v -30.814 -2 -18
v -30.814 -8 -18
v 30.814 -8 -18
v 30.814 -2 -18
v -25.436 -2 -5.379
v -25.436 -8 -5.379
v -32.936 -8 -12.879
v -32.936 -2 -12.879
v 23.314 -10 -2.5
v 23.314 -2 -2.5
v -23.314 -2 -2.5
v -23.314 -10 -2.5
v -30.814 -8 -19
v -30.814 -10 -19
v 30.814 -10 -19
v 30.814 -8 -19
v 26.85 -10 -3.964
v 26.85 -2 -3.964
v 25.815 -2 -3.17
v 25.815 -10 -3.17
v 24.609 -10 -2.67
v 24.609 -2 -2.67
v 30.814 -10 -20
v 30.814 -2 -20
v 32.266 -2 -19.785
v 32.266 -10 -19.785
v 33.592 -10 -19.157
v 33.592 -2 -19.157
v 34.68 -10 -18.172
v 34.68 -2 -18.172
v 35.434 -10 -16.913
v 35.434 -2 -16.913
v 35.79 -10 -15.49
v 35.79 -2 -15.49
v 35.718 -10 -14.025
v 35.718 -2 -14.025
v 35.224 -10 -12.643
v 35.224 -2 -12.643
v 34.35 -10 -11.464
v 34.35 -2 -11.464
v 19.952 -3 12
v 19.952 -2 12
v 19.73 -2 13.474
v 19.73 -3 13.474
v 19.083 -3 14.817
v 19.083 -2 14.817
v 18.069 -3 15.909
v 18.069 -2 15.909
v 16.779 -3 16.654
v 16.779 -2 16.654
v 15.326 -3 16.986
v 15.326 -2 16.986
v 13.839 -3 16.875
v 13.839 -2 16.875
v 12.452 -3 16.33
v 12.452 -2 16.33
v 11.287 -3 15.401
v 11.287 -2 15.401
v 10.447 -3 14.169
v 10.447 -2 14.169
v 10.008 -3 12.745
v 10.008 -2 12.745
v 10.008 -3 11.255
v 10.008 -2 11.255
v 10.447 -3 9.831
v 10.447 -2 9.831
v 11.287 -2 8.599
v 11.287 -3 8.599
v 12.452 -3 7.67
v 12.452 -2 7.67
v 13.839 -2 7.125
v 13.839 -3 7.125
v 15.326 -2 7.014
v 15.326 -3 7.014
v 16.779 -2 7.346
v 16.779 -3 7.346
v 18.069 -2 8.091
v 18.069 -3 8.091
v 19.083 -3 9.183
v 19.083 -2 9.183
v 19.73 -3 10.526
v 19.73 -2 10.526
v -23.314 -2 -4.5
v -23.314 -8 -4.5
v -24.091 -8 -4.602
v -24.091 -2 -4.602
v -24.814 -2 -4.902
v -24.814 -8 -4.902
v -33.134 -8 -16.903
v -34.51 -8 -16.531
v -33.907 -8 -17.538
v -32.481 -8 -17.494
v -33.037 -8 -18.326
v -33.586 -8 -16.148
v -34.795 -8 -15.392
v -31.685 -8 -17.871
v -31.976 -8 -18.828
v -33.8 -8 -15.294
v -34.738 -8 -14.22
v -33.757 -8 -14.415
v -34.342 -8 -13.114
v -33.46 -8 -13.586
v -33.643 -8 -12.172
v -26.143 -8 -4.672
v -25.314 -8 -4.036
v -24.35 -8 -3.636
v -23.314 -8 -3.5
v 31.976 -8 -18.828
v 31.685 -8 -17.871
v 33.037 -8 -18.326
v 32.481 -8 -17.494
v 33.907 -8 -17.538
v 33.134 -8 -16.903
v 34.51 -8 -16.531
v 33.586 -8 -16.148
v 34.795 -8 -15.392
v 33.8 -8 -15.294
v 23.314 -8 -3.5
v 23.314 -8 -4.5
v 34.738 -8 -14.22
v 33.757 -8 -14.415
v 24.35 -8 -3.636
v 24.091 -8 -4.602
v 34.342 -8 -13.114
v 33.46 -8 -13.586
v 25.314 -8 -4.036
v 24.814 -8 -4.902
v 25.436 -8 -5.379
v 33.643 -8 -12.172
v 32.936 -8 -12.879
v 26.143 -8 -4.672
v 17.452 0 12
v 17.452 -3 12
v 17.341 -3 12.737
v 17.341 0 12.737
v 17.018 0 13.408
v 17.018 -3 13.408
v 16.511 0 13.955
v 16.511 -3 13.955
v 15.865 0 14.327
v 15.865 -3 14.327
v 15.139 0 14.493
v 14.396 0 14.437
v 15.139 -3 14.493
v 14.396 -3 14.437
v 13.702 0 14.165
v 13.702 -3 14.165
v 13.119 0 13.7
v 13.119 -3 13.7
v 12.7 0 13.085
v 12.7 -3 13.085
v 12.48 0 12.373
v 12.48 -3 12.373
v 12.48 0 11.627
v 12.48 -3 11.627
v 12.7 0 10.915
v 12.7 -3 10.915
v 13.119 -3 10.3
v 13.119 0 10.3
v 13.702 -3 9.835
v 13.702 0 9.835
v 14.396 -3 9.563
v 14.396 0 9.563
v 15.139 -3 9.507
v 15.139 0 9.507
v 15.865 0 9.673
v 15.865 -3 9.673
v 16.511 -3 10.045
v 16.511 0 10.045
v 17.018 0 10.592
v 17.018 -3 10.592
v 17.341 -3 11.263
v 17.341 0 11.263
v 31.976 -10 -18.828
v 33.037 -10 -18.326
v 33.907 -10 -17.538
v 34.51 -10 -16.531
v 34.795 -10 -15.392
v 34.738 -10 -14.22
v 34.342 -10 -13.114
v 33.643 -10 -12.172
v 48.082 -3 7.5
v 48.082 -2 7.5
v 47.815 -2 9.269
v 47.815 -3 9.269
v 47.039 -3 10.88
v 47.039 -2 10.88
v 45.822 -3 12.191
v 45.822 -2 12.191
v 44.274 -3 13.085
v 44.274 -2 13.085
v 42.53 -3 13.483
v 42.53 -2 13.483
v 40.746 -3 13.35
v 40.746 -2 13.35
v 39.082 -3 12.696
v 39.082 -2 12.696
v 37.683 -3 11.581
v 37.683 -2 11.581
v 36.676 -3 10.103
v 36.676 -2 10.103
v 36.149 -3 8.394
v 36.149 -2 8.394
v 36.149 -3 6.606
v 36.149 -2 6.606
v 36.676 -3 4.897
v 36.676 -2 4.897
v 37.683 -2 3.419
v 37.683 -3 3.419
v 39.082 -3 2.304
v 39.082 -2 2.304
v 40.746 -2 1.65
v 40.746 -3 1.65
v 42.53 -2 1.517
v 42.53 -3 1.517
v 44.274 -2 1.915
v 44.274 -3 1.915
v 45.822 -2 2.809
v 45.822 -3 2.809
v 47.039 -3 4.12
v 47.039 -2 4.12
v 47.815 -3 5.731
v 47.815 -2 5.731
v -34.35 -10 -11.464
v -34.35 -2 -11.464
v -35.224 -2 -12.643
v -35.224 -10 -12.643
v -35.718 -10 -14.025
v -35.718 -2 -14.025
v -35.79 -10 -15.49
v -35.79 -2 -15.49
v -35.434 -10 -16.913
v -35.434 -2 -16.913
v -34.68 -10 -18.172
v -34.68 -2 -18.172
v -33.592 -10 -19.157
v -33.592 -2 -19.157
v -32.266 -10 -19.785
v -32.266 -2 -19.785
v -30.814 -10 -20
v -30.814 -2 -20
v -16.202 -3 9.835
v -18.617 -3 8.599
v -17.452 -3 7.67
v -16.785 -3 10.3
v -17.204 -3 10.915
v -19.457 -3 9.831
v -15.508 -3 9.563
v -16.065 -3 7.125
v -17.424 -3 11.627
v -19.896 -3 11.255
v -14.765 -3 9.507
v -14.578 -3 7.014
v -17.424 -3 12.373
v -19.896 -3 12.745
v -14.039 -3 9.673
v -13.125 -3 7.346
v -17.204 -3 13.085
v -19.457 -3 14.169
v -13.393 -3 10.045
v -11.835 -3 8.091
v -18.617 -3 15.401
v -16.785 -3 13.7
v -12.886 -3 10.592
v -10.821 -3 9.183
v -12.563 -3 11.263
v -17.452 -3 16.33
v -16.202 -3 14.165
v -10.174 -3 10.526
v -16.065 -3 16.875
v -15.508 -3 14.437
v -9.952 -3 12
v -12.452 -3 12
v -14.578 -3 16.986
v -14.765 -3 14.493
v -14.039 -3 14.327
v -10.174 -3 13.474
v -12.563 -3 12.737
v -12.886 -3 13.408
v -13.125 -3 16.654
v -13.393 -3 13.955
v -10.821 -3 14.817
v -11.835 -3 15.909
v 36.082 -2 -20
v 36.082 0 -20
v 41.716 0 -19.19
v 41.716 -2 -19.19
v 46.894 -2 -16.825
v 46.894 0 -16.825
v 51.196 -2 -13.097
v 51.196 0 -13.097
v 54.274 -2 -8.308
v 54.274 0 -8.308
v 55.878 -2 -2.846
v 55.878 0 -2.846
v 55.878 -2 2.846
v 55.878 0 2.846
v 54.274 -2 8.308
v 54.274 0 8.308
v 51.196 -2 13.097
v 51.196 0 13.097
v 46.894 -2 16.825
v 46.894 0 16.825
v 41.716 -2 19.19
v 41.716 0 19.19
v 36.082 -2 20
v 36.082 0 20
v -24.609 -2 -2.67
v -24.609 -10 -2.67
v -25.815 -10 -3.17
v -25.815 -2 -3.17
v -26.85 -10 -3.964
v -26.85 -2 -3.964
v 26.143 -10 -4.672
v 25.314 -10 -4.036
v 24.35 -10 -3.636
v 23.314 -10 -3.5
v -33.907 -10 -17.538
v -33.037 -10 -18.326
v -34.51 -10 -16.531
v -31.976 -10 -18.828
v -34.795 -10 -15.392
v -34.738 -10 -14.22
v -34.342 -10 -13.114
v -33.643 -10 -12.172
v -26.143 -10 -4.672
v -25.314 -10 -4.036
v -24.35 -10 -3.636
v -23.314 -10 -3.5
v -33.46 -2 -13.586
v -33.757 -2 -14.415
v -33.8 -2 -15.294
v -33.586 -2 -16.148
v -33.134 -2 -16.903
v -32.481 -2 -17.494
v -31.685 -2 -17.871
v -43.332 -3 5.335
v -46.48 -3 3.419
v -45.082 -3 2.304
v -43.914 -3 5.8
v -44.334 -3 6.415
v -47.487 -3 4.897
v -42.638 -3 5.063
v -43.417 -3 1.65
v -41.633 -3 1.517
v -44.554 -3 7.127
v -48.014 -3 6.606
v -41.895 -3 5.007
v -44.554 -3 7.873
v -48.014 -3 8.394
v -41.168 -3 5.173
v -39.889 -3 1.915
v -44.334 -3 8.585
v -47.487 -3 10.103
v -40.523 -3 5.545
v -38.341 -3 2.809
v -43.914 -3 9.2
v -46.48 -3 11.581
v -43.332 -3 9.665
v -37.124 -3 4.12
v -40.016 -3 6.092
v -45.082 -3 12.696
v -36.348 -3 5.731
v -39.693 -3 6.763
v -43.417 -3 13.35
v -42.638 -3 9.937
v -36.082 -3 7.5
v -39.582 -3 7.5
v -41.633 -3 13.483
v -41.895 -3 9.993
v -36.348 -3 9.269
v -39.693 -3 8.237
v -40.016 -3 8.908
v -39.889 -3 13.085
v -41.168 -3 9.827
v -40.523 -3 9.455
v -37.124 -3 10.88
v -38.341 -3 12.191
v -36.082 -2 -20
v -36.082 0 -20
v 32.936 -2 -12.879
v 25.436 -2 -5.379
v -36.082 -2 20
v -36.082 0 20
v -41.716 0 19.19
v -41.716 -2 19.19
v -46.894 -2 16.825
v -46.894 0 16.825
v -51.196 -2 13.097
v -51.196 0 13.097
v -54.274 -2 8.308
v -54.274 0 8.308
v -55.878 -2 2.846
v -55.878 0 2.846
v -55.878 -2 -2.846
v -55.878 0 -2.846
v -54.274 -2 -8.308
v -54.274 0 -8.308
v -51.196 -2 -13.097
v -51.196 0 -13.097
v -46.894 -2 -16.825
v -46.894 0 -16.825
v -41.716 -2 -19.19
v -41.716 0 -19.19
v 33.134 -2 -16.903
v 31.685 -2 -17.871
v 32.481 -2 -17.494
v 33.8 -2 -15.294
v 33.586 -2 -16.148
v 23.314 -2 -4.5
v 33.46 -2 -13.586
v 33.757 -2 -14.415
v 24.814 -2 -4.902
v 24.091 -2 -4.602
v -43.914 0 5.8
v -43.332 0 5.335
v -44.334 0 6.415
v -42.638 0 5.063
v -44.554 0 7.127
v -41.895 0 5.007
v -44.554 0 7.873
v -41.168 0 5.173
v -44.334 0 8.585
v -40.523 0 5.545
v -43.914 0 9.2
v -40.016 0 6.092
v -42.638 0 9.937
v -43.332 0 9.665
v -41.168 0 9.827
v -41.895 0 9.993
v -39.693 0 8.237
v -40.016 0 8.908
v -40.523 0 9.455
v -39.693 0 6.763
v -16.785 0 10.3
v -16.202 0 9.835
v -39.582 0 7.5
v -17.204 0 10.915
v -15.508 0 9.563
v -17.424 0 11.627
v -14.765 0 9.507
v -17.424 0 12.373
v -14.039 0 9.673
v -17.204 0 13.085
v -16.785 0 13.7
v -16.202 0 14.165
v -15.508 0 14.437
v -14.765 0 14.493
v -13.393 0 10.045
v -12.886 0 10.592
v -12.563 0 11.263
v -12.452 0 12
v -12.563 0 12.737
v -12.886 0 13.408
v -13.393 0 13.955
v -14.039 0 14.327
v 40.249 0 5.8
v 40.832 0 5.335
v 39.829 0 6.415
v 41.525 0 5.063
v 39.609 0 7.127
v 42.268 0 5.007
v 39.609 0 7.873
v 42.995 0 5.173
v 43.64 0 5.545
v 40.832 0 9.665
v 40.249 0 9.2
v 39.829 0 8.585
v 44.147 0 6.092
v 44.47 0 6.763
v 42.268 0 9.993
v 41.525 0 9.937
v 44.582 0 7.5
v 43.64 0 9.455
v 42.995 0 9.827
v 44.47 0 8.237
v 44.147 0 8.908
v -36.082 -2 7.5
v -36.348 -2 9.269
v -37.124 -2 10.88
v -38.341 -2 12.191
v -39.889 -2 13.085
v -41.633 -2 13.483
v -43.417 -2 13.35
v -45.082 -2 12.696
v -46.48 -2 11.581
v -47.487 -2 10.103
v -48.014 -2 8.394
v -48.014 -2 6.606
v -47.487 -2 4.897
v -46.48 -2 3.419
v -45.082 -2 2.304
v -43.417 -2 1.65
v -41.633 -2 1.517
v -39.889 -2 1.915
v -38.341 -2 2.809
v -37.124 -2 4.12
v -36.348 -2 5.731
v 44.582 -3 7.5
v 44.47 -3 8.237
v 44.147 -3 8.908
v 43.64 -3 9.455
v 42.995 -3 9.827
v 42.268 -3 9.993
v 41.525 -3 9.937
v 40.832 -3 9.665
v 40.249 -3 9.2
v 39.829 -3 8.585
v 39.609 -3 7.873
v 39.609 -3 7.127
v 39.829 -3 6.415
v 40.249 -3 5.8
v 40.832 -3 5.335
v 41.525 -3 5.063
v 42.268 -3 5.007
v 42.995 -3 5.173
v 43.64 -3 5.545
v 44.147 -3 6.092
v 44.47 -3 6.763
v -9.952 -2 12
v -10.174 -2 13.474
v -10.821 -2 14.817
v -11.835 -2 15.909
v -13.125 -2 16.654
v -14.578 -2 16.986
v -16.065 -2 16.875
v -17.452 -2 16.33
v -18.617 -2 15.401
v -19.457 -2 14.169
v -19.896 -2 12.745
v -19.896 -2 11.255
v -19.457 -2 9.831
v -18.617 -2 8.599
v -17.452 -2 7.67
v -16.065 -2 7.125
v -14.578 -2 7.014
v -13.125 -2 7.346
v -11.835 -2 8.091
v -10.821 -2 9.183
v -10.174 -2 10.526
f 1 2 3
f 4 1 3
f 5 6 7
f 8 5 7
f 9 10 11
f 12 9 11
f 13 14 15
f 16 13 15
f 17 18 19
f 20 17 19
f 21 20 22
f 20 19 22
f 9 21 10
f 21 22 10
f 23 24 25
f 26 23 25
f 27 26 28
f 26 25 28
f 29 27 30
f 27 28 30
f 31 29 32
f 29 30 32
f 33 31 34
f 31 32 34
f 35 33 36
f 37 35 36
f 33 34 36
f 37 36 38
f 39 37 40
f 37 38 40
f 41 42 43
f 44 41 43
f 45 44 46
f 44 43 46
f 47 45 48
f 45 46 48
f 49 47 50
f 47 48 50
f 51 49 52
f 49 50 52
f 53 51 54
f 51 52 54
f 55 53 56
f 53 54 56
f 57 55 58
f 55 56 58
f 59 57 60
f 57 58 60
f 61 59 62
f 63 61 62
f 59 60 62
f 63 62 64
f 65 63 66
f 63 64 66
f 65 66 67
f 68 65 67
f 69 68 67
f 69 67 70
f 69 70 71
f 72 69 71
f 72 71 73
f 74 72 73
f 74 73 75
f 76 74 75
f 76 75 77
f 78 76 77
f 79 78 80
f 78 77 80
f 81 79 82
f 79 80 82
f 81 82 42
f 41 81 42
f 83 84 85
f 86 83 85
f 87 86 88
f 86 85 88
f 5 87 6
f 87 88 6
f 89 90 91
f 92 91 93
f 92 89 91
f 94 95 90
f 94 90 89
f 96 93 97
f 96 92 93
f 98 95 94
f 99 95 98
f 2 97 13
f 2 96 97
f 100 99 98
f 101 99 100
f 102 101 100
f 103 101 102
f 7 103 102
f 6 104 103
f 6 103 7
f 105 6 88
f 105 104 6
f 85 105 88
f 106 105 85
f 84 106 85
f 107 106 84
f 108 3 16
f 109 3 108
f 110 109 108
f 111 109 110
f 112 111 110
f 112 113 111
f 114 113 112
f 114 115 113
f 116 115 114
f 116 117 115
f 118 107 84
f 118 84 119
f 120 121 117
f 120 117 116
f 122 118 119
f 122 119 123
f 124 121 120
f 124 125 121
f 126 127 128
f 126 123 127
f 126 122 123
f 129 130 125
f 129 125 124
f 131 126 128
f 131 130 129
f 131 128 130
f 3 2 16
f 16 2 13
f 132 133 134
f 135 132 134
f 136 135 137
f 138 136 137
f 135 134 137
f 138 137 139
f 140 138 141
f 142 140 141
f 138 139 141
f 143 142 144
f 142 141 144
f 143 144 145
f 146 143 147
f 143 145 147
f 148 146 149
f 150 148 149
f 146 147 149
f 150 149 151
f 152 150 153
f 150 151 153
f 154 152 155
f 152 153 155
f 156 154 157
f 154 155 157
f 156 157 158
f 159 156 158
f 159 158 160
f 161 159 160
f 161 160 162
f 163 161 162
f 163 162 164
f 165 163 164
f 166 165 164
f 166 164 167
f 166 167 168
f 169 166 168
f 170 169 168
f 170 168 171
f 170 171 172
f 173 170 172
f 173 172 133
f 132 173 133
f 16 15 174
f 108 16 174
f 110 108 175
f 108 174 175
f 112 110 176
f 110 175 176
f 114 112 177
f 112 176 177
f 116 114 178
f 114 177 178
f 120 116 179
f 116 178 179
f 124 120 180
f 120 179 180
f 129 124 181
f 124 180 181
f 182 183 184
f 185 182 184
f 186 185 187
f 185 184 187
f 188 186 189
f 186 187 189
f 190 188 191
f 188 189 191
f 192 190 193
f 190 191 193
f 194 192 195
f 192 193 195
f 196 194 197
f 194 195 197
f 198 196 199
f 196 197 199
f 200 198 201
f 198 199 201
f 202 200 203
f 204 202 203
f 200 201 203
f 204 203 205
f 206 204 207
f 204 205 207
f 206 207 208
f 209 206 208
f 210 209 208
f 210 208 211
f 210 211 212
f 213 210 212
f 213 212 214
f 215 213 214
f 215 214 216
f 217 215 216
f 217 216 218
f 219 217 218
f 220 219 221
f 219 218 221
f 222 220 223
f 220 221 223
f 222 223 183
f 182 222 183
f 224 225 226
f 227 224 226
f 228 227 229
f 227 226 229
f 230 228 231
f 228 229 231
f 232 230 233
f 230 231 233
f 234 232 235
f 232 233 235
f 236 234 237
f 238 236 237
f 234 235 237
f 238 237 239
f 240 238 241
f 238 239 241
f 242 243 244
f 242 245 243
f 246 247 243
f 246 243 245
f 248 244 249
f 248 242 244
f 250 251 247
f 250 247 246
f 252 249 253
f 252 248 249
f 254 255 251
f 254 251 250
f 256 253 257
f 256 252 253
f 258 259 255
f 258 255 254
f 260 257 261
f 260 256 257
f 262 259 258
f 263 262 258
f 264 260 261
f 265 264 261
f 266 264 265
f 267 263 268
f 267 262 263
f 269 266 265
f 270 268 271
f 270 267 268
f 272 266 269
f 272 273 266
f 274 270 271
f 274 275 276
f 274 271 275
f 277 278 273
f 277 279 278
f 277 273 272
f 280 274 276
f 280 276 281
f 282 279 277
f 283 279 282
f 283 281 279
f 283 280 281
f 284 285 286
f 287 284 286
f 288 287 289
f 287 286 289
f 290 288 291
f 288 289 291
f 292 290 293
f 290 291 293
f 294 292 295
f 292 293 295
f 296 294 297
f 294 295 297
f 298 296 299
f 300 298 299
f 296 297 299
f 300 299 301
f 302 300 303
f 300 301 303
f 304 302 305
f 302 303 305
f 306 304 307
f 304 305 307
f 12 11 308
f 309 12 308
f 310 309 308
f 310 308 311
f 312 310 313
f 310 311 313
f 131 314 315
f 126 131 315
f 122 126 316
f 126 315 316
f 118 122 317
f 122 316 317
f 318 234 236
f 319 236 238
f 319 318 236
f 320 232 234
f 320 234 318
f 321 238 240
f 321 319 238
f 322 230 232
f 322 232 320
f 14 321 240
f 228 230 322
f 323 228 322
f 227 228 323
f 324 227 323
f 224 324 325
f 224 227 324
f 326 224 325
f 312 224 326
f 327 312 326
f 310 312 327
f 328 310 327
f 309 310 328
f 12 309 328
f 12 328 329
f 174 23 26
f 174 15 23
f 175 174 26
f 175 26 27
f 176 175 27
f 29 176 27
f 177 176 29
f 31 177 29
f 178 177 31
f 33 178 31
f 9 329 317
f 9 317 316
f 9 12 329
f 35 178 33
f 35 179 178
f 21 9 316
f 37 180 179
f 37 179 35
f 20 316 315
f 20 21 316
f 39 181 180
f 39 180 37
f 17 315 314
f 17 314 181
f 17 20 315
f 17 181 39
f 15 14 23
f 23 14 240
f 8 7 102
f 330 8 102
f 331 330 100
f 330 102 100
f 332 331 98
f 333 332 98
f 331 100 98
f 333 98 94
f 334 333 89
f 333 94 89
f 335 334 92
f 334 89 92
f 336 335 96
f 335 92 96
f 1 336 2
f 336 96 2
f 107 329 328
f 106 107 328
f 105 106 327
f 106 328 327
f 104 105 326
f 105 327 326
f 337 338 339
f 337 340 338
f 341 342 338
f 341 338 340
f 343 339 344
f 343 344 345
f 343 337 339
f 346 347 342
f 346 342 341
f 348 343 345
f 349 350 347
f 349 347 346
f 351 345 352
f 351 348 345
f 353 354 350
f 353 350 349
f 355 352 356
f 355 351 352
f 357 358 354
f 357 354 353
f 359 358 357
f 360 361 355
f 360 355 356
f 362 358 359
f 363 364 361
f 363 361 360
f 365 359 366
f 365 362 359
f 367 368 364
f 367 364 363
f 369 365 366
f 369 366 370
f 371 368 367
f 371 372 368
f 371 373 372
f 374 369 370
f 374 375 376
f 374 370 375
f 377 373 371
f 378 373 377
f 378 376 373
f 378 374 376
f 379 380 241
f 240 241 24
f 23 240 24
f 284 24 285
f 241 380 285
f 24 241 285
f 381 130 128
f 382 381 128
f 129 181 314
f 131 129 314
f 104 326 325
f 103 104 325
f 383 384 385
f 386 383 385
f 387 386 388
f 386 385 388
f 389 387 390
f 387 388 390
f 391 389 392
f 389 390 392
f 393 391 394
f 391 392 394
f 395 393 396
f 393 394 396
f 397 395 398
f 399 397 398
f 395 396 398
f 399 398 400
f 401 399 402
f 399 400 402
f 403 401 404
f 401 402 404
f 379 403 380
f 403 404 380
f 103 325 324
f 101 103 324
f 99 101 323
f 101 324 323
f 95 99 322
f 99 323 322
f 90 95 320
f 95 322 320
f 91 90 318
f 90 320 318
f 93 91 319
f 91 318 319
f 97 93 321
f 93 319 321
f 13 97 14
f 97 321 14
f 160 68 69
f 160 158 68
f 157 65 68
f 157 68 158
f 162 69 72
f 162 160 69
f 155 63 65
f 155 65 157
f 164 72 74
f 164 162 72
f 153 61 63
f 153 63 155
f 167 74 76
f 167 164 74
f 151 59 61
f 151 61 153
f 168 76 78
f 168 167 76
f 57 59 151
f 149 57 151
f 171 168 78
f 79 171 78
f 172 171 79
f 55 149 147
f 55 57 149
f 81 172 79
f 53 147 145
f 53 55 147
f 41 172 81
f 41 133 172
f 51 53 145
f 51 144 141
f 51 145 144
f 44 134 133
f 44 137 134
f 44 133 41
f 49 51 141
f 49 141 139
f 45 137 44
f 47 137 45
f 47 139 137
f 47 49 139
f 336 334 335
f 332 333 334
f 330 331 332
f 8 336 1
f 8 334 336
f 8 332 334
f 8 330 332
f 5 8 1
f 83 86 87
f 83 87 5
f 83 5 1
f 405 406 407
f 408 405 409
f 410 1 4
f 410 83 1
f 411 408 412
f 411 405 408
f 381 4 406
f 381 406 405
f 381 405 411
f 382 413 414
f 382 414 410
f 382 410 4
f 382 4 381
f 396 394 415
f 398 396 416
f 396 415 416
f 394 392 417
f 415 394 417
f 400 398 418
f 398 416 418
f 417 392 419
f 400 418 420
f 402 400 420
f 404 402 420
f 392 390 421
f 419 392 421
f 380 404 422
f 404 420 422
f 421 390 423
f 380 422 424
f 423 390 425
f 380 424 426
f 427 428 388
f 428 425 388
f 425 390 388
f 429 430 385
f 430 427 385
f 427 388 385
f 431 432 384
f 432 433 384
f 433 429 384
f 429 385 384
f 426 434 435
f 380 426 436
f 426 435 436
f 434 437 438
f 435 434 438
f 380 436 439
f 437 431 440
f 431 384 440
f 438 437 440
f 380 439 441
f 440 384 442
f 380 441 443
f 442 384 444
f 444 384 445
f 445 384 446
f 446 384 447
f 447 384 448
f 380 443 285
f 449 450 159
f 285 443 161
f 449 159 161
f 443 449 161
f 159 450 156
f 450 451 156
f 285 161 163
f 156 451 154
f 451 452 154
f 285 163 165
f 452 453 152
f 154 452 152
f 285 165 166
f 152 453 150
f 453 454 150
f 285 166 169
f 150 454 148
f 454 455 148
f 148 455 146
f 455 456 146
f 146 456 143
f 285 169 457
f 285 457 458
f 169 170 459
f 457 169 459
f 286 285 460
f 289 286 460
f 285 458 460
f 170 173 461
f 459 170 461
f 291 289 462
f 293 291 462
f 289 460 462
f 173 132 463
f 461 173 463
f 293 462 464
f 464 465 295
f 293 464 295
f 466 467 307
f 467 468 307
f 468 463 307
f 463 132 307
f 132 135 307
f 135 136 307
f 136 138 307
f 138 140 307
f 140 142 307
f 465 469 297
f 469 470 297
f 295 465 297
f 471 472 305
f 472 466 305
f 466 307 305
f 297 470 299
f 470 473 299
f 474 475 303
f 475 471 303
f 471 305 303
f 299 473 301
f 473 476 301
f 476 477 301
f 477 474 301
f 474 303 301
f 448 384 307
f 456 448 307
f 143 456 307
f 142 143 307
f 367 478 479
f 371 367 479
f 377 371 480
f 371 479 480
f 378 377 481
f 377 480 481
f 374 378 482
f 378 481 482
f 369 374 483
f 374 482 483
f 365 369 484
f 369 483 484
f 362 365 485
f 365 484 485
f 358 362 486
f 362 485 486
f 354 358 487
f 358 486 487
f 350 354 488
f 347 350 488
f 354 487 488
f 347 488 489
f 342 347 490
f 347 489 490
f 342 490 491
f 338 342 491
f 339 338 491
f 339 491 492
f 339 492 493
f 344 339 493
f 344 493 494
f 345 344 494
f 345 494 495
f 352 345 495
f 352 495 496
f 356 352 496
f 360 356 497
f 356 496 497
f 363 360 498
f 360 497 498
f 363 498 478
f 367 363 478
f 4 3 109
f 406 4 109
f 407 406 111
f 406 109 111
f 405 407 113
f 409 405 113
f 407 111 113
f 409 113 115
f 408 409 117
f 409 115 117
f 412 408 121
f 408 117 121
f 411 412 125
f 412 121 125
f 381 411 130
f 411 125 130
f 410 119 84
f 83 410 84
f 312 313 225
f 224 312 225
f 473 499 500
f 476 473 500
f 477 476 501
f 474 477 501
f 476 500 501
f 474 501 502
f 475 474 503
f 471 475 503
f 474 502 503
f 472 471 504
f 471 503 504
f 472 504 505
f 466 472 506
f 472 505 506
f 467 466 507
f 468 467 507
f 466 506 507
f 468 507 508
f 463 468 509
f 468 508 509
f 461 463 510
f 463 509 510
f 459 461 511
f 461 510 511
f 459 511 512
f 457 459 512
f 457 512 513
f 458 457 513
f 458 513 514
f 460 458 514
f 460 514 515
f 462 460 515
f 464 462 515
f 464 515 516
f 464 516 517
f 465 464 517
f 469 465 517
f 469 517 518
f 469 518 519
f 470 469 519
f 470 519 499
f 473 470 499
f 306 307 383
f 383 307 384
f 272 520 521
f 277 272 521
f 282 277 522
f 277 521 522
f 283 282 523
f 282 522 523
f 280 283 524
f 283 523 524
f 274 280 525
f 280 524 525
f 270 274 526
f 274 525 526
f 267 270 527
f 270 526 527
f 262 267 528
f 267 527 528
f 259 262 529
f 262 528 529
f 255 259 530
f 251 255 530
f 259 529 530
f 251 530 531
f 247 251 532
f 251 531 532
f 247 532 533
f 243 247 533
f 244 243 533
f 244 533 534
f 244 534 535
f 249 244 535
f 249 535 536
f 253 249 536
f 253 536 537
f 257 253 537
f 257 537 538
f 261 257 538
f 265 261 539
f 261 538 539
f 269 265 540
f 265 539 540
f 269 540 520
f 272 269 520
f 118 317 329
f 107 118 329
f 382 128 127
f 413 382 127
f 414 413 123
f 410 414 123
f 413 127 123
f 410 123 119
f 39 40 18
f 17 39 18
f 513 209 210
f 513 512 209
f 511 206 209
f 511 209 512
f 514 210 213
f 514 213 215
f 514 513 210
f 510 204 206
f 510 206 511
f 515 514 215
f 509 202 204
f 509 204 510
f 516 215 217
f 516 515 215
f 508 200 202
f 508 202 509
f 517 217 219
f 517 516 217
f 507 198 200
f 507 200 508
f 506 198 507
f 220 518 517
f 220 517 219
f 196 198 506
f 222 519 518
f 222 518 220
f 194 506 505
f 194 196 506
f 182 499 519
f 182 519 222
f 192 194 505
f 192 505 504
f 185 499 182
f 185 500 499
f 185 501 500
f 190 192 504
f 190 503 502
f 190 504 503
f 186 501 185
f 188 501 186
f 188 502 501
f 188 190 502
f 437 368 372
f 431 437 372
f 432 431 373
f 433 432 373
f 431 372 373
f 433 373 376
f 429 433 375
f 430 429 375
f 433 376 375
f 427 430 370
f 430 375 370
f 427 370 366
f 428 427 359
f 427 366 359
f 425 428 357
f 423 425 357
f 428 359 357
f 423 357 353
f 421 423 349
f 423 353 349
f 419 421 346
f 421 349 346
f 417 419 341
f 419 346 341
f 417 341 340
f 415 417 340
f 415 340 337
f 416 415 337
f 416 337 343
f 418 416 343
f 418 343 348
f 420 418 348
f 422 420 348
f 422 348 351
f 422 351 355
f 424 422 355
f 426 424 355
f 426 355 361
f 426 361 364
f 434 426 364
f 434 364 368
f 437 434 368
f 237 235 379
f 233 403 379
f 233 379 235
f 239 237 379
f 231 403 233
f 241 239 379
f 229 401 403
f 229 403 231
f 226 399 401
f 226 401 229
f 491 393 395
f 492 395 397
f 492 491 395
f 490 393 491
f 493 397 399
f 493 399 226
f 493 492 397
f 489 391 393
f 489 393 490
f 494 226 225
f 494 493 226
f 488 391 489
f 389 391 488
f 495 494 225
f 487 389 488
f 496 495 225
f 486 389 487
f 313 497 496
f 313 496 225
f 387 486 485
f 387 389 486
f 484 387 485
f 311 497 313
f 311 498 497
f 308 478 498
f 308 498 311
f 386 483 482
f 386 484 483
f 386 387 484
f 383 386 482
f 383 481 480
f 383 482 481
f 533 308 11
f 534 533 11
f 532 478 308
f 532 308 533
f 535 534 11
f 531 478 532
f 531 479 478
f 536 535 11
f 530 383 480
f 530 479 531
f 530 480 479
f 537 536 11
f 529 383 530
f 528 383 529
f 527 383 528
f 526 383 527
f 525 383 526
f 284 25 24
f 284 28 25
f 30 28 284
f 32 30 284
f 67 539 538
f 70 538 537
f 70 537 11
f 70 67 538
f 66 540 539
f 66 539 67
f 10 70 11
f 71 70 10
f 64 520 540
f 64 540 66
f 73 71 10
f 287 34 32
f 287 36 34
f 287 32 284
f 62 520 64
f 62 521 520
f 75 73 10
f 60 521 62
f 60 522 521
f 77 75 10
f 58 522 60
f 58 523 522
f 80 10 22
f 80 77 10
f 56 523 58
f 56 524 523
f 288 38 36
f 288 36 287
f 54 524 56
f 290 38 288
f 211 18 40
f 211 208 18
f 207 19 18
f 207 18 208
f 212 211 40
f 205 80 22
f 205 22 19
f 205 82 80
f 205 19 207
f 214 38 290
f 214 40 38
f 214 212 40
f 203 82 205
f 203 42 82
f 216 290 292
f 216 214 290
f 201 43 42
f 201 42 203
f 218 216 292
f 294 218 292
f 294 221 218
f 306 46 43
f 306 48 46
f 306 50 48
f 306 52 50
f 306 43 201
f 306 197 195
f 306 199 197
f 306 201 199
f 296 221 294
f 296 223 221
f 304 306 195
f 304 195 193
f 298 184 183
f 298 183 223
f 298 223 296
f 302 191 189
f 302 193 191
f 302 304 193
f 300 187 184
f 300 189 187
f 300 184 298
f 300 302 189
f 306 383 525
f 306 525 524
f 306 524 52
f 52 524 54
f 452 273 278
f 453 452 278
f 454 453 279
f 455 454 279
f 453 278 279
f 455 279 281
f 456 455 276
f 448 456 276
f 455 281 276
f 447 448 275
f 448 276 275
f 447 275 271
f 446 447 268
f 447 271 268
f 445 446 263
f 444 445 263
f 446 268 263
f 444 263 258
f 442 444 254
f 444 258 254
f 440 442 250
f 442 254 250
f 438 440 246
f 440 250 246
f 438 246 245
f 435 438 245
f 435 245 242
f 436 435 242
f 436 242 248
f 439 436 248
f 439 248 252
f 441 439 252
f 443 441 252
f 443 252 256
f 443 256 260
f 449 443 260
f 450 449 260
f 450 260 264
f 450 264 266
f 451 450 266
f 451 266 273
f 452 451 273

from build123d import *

# Parameters (mm, degrees)
F1_DEPTH  = 2
F3_DEPTH  = 8
F5_DEPTH  = 2
F7_DEPTH  = 6
F8_R      = 5
F8_R_2    = 6
F9_DEPTH  = 1
F10_R     = 2.5
F11_R     = 2.5
F12_DEPTH = 3.001


# Not quite as in the source:
# - a feature names something its author has since deleted; it is built from what else it names


with BuildPart() as f1:
    # F0 (on Front) → F1 (new body)
    with BuildSketch(Plane.XZ):
        with BuildLine():
            Line((-36.0815, -20), (36.0815, -20))
            ThreePointArc((36.0815, -20), (56.0815, 0), (36.0815, 20))
            Line((36.0815, 20), (-36.0815, 20))
            ThreePointArc((-36.0815, 20), (-56.0815, 0), (-36.0815, -20))
        make_face()
    extrude(amount=F1_DEPTH)

    # F2 (on face) → F3 (join)
    with BuildSketch(Plane.XZ.offset(2)):
        with BuildLine():
            Line((23.3145, -2.5), (0, -2.5))
            Line((0, -2.5), (-23.3145, -2.5))
            ThreePointArc((-23.3145, -2.5), (-25.2279171618, -2.8806023374), (-26.8500339059, -3.9644660941))
            Line((-26.8500339059, -3.9644660941), (-34.3500339059, -11.4644660941))
            ThreePointArc((-34.3500339059, -11.4644660941), (-35.4338976626, -16.9134171618), (-30.8145, -20))
            Line((-30.8145, -20), (0, -20))
            Line((0, -20), (30.8145, -20))
            ThreePointArc((30.8145, -20), (35.4338976626, -16.9134171618), (34.3500339059, -11.4644660941))
            Line((34.3500339059, -11.4644660941), (26.8500339059, -3.9644660941))
            ThreePointArc((26.8500339059, -3.9644660941), (25.2279171618, -2.8806023374), (23.3145, -2.5))
        make_face()
    extrude(amount=F3_DEPTH)

    # F4 (on face) → F5 (cut)
    with BuildSketch(Plane.XZ.offset(10)):
        with BuildLine():
            Line((-26.1429271247, -4.6715728753), (-33.6429271247, -12.1715728753))
            ThreePointArc((-33.6429271247, -12.1715728753), (-34.51001813, -16.5307337295), (-30.8145, -19))
            Line((-30.8145, -19), (30.8145, -19))
            ThreePointArc((30.8145, -19), (34.51001813, -16.5307337295), (33.6429271247, -12.1715728753))
            Line((33.6429271247, -12.1715728753), (26.1429271247, -4.6715728753))
            ThreePointArc((26.1429271247, -4.6715728753), (24.8452337295, -3.80448187), (23.3145, -3.5))
            Line((23.3145, -3.5), (-23.3145, -3.5))
            ThreePointArc((-23.3145, -3.5), (-24.8452337295, -3.80448187), (-26.1429271247, -4.6715728753))
        make_face()
    extrude(amount=-F5_DEPTH, mode=Mode.SUBTRACT)

    # F6 (on face) → F7 (cut)
    with BuildSketch(Plane.XZ.offset(8)):
        with BuildLine():
            ThreePointArc((30.8145, -18), (33.5861385975, -16.1480502971), (32.9358203436, -12.8786796564))
            Line((32.9358203436, -12.8786796564), (25.4358203436, -5.3786796564))
            ThreePointArc((25.4358203436, -5.3786796564), (24.4625502971, -4.7283614025), (23.3145, -4.5))
            Line((23.3145, -4.5), (-23.3145, -4.5))
            ThreePointArc((-23.3145, -4.5), (-24.4625502971, -4.7283614025), (-25.4358203436, -5.3786796564))
            Line((-25.4358203436, -5.3786796564), (-32.9358203436, -12.8786796564))
            ThreePointArc((-32.9358203436, -12.8786796564), (-33.5861385975, -16.1480502971), (-30.8145, -18))
            Line((-30.8145, -18), (30.8145, -18))
        make_face()
    extrude(amount=-F7_DEPTH, mode=Mode.SUBTRACT)

    # F8 (on face) → F9 (join)
    with BuildSketch(Plane.XZ.offset(2)):
        with Locations((-14.952, 12)):
            Circle(F8_R)
        with Locations((-42.0815, 7.5)):
            Circle(F8_R_2)
        with Locations((14.952, 12)):
            Circle(F8_R)
        with Locations((42.0815, 7.5)):
            Circle(F8_R_2)
    extrude(amount=F9_DEPTH)

    # F10 (on face) + F11 (on face) → F12 (cut, through all)
    with BuildSketch(Plane.XZ.offset(3)):
        with Locations((-14.952, 12)):
            Circle(F10_R)
        with Locations((14.952, 12)):
            Circle(F10_R)
    with BuildSketch(Plane.XZ.offset(3)):
        with Locations((-42.0815, 7.5)):
            Circle(F11_R)
        with Locations((42.0815, 7.5)):
            Circle(F11_R)
    extrude(amount=-F12_DEPTH, mode=Mode.SUBTRACT)


solid = f1.part
